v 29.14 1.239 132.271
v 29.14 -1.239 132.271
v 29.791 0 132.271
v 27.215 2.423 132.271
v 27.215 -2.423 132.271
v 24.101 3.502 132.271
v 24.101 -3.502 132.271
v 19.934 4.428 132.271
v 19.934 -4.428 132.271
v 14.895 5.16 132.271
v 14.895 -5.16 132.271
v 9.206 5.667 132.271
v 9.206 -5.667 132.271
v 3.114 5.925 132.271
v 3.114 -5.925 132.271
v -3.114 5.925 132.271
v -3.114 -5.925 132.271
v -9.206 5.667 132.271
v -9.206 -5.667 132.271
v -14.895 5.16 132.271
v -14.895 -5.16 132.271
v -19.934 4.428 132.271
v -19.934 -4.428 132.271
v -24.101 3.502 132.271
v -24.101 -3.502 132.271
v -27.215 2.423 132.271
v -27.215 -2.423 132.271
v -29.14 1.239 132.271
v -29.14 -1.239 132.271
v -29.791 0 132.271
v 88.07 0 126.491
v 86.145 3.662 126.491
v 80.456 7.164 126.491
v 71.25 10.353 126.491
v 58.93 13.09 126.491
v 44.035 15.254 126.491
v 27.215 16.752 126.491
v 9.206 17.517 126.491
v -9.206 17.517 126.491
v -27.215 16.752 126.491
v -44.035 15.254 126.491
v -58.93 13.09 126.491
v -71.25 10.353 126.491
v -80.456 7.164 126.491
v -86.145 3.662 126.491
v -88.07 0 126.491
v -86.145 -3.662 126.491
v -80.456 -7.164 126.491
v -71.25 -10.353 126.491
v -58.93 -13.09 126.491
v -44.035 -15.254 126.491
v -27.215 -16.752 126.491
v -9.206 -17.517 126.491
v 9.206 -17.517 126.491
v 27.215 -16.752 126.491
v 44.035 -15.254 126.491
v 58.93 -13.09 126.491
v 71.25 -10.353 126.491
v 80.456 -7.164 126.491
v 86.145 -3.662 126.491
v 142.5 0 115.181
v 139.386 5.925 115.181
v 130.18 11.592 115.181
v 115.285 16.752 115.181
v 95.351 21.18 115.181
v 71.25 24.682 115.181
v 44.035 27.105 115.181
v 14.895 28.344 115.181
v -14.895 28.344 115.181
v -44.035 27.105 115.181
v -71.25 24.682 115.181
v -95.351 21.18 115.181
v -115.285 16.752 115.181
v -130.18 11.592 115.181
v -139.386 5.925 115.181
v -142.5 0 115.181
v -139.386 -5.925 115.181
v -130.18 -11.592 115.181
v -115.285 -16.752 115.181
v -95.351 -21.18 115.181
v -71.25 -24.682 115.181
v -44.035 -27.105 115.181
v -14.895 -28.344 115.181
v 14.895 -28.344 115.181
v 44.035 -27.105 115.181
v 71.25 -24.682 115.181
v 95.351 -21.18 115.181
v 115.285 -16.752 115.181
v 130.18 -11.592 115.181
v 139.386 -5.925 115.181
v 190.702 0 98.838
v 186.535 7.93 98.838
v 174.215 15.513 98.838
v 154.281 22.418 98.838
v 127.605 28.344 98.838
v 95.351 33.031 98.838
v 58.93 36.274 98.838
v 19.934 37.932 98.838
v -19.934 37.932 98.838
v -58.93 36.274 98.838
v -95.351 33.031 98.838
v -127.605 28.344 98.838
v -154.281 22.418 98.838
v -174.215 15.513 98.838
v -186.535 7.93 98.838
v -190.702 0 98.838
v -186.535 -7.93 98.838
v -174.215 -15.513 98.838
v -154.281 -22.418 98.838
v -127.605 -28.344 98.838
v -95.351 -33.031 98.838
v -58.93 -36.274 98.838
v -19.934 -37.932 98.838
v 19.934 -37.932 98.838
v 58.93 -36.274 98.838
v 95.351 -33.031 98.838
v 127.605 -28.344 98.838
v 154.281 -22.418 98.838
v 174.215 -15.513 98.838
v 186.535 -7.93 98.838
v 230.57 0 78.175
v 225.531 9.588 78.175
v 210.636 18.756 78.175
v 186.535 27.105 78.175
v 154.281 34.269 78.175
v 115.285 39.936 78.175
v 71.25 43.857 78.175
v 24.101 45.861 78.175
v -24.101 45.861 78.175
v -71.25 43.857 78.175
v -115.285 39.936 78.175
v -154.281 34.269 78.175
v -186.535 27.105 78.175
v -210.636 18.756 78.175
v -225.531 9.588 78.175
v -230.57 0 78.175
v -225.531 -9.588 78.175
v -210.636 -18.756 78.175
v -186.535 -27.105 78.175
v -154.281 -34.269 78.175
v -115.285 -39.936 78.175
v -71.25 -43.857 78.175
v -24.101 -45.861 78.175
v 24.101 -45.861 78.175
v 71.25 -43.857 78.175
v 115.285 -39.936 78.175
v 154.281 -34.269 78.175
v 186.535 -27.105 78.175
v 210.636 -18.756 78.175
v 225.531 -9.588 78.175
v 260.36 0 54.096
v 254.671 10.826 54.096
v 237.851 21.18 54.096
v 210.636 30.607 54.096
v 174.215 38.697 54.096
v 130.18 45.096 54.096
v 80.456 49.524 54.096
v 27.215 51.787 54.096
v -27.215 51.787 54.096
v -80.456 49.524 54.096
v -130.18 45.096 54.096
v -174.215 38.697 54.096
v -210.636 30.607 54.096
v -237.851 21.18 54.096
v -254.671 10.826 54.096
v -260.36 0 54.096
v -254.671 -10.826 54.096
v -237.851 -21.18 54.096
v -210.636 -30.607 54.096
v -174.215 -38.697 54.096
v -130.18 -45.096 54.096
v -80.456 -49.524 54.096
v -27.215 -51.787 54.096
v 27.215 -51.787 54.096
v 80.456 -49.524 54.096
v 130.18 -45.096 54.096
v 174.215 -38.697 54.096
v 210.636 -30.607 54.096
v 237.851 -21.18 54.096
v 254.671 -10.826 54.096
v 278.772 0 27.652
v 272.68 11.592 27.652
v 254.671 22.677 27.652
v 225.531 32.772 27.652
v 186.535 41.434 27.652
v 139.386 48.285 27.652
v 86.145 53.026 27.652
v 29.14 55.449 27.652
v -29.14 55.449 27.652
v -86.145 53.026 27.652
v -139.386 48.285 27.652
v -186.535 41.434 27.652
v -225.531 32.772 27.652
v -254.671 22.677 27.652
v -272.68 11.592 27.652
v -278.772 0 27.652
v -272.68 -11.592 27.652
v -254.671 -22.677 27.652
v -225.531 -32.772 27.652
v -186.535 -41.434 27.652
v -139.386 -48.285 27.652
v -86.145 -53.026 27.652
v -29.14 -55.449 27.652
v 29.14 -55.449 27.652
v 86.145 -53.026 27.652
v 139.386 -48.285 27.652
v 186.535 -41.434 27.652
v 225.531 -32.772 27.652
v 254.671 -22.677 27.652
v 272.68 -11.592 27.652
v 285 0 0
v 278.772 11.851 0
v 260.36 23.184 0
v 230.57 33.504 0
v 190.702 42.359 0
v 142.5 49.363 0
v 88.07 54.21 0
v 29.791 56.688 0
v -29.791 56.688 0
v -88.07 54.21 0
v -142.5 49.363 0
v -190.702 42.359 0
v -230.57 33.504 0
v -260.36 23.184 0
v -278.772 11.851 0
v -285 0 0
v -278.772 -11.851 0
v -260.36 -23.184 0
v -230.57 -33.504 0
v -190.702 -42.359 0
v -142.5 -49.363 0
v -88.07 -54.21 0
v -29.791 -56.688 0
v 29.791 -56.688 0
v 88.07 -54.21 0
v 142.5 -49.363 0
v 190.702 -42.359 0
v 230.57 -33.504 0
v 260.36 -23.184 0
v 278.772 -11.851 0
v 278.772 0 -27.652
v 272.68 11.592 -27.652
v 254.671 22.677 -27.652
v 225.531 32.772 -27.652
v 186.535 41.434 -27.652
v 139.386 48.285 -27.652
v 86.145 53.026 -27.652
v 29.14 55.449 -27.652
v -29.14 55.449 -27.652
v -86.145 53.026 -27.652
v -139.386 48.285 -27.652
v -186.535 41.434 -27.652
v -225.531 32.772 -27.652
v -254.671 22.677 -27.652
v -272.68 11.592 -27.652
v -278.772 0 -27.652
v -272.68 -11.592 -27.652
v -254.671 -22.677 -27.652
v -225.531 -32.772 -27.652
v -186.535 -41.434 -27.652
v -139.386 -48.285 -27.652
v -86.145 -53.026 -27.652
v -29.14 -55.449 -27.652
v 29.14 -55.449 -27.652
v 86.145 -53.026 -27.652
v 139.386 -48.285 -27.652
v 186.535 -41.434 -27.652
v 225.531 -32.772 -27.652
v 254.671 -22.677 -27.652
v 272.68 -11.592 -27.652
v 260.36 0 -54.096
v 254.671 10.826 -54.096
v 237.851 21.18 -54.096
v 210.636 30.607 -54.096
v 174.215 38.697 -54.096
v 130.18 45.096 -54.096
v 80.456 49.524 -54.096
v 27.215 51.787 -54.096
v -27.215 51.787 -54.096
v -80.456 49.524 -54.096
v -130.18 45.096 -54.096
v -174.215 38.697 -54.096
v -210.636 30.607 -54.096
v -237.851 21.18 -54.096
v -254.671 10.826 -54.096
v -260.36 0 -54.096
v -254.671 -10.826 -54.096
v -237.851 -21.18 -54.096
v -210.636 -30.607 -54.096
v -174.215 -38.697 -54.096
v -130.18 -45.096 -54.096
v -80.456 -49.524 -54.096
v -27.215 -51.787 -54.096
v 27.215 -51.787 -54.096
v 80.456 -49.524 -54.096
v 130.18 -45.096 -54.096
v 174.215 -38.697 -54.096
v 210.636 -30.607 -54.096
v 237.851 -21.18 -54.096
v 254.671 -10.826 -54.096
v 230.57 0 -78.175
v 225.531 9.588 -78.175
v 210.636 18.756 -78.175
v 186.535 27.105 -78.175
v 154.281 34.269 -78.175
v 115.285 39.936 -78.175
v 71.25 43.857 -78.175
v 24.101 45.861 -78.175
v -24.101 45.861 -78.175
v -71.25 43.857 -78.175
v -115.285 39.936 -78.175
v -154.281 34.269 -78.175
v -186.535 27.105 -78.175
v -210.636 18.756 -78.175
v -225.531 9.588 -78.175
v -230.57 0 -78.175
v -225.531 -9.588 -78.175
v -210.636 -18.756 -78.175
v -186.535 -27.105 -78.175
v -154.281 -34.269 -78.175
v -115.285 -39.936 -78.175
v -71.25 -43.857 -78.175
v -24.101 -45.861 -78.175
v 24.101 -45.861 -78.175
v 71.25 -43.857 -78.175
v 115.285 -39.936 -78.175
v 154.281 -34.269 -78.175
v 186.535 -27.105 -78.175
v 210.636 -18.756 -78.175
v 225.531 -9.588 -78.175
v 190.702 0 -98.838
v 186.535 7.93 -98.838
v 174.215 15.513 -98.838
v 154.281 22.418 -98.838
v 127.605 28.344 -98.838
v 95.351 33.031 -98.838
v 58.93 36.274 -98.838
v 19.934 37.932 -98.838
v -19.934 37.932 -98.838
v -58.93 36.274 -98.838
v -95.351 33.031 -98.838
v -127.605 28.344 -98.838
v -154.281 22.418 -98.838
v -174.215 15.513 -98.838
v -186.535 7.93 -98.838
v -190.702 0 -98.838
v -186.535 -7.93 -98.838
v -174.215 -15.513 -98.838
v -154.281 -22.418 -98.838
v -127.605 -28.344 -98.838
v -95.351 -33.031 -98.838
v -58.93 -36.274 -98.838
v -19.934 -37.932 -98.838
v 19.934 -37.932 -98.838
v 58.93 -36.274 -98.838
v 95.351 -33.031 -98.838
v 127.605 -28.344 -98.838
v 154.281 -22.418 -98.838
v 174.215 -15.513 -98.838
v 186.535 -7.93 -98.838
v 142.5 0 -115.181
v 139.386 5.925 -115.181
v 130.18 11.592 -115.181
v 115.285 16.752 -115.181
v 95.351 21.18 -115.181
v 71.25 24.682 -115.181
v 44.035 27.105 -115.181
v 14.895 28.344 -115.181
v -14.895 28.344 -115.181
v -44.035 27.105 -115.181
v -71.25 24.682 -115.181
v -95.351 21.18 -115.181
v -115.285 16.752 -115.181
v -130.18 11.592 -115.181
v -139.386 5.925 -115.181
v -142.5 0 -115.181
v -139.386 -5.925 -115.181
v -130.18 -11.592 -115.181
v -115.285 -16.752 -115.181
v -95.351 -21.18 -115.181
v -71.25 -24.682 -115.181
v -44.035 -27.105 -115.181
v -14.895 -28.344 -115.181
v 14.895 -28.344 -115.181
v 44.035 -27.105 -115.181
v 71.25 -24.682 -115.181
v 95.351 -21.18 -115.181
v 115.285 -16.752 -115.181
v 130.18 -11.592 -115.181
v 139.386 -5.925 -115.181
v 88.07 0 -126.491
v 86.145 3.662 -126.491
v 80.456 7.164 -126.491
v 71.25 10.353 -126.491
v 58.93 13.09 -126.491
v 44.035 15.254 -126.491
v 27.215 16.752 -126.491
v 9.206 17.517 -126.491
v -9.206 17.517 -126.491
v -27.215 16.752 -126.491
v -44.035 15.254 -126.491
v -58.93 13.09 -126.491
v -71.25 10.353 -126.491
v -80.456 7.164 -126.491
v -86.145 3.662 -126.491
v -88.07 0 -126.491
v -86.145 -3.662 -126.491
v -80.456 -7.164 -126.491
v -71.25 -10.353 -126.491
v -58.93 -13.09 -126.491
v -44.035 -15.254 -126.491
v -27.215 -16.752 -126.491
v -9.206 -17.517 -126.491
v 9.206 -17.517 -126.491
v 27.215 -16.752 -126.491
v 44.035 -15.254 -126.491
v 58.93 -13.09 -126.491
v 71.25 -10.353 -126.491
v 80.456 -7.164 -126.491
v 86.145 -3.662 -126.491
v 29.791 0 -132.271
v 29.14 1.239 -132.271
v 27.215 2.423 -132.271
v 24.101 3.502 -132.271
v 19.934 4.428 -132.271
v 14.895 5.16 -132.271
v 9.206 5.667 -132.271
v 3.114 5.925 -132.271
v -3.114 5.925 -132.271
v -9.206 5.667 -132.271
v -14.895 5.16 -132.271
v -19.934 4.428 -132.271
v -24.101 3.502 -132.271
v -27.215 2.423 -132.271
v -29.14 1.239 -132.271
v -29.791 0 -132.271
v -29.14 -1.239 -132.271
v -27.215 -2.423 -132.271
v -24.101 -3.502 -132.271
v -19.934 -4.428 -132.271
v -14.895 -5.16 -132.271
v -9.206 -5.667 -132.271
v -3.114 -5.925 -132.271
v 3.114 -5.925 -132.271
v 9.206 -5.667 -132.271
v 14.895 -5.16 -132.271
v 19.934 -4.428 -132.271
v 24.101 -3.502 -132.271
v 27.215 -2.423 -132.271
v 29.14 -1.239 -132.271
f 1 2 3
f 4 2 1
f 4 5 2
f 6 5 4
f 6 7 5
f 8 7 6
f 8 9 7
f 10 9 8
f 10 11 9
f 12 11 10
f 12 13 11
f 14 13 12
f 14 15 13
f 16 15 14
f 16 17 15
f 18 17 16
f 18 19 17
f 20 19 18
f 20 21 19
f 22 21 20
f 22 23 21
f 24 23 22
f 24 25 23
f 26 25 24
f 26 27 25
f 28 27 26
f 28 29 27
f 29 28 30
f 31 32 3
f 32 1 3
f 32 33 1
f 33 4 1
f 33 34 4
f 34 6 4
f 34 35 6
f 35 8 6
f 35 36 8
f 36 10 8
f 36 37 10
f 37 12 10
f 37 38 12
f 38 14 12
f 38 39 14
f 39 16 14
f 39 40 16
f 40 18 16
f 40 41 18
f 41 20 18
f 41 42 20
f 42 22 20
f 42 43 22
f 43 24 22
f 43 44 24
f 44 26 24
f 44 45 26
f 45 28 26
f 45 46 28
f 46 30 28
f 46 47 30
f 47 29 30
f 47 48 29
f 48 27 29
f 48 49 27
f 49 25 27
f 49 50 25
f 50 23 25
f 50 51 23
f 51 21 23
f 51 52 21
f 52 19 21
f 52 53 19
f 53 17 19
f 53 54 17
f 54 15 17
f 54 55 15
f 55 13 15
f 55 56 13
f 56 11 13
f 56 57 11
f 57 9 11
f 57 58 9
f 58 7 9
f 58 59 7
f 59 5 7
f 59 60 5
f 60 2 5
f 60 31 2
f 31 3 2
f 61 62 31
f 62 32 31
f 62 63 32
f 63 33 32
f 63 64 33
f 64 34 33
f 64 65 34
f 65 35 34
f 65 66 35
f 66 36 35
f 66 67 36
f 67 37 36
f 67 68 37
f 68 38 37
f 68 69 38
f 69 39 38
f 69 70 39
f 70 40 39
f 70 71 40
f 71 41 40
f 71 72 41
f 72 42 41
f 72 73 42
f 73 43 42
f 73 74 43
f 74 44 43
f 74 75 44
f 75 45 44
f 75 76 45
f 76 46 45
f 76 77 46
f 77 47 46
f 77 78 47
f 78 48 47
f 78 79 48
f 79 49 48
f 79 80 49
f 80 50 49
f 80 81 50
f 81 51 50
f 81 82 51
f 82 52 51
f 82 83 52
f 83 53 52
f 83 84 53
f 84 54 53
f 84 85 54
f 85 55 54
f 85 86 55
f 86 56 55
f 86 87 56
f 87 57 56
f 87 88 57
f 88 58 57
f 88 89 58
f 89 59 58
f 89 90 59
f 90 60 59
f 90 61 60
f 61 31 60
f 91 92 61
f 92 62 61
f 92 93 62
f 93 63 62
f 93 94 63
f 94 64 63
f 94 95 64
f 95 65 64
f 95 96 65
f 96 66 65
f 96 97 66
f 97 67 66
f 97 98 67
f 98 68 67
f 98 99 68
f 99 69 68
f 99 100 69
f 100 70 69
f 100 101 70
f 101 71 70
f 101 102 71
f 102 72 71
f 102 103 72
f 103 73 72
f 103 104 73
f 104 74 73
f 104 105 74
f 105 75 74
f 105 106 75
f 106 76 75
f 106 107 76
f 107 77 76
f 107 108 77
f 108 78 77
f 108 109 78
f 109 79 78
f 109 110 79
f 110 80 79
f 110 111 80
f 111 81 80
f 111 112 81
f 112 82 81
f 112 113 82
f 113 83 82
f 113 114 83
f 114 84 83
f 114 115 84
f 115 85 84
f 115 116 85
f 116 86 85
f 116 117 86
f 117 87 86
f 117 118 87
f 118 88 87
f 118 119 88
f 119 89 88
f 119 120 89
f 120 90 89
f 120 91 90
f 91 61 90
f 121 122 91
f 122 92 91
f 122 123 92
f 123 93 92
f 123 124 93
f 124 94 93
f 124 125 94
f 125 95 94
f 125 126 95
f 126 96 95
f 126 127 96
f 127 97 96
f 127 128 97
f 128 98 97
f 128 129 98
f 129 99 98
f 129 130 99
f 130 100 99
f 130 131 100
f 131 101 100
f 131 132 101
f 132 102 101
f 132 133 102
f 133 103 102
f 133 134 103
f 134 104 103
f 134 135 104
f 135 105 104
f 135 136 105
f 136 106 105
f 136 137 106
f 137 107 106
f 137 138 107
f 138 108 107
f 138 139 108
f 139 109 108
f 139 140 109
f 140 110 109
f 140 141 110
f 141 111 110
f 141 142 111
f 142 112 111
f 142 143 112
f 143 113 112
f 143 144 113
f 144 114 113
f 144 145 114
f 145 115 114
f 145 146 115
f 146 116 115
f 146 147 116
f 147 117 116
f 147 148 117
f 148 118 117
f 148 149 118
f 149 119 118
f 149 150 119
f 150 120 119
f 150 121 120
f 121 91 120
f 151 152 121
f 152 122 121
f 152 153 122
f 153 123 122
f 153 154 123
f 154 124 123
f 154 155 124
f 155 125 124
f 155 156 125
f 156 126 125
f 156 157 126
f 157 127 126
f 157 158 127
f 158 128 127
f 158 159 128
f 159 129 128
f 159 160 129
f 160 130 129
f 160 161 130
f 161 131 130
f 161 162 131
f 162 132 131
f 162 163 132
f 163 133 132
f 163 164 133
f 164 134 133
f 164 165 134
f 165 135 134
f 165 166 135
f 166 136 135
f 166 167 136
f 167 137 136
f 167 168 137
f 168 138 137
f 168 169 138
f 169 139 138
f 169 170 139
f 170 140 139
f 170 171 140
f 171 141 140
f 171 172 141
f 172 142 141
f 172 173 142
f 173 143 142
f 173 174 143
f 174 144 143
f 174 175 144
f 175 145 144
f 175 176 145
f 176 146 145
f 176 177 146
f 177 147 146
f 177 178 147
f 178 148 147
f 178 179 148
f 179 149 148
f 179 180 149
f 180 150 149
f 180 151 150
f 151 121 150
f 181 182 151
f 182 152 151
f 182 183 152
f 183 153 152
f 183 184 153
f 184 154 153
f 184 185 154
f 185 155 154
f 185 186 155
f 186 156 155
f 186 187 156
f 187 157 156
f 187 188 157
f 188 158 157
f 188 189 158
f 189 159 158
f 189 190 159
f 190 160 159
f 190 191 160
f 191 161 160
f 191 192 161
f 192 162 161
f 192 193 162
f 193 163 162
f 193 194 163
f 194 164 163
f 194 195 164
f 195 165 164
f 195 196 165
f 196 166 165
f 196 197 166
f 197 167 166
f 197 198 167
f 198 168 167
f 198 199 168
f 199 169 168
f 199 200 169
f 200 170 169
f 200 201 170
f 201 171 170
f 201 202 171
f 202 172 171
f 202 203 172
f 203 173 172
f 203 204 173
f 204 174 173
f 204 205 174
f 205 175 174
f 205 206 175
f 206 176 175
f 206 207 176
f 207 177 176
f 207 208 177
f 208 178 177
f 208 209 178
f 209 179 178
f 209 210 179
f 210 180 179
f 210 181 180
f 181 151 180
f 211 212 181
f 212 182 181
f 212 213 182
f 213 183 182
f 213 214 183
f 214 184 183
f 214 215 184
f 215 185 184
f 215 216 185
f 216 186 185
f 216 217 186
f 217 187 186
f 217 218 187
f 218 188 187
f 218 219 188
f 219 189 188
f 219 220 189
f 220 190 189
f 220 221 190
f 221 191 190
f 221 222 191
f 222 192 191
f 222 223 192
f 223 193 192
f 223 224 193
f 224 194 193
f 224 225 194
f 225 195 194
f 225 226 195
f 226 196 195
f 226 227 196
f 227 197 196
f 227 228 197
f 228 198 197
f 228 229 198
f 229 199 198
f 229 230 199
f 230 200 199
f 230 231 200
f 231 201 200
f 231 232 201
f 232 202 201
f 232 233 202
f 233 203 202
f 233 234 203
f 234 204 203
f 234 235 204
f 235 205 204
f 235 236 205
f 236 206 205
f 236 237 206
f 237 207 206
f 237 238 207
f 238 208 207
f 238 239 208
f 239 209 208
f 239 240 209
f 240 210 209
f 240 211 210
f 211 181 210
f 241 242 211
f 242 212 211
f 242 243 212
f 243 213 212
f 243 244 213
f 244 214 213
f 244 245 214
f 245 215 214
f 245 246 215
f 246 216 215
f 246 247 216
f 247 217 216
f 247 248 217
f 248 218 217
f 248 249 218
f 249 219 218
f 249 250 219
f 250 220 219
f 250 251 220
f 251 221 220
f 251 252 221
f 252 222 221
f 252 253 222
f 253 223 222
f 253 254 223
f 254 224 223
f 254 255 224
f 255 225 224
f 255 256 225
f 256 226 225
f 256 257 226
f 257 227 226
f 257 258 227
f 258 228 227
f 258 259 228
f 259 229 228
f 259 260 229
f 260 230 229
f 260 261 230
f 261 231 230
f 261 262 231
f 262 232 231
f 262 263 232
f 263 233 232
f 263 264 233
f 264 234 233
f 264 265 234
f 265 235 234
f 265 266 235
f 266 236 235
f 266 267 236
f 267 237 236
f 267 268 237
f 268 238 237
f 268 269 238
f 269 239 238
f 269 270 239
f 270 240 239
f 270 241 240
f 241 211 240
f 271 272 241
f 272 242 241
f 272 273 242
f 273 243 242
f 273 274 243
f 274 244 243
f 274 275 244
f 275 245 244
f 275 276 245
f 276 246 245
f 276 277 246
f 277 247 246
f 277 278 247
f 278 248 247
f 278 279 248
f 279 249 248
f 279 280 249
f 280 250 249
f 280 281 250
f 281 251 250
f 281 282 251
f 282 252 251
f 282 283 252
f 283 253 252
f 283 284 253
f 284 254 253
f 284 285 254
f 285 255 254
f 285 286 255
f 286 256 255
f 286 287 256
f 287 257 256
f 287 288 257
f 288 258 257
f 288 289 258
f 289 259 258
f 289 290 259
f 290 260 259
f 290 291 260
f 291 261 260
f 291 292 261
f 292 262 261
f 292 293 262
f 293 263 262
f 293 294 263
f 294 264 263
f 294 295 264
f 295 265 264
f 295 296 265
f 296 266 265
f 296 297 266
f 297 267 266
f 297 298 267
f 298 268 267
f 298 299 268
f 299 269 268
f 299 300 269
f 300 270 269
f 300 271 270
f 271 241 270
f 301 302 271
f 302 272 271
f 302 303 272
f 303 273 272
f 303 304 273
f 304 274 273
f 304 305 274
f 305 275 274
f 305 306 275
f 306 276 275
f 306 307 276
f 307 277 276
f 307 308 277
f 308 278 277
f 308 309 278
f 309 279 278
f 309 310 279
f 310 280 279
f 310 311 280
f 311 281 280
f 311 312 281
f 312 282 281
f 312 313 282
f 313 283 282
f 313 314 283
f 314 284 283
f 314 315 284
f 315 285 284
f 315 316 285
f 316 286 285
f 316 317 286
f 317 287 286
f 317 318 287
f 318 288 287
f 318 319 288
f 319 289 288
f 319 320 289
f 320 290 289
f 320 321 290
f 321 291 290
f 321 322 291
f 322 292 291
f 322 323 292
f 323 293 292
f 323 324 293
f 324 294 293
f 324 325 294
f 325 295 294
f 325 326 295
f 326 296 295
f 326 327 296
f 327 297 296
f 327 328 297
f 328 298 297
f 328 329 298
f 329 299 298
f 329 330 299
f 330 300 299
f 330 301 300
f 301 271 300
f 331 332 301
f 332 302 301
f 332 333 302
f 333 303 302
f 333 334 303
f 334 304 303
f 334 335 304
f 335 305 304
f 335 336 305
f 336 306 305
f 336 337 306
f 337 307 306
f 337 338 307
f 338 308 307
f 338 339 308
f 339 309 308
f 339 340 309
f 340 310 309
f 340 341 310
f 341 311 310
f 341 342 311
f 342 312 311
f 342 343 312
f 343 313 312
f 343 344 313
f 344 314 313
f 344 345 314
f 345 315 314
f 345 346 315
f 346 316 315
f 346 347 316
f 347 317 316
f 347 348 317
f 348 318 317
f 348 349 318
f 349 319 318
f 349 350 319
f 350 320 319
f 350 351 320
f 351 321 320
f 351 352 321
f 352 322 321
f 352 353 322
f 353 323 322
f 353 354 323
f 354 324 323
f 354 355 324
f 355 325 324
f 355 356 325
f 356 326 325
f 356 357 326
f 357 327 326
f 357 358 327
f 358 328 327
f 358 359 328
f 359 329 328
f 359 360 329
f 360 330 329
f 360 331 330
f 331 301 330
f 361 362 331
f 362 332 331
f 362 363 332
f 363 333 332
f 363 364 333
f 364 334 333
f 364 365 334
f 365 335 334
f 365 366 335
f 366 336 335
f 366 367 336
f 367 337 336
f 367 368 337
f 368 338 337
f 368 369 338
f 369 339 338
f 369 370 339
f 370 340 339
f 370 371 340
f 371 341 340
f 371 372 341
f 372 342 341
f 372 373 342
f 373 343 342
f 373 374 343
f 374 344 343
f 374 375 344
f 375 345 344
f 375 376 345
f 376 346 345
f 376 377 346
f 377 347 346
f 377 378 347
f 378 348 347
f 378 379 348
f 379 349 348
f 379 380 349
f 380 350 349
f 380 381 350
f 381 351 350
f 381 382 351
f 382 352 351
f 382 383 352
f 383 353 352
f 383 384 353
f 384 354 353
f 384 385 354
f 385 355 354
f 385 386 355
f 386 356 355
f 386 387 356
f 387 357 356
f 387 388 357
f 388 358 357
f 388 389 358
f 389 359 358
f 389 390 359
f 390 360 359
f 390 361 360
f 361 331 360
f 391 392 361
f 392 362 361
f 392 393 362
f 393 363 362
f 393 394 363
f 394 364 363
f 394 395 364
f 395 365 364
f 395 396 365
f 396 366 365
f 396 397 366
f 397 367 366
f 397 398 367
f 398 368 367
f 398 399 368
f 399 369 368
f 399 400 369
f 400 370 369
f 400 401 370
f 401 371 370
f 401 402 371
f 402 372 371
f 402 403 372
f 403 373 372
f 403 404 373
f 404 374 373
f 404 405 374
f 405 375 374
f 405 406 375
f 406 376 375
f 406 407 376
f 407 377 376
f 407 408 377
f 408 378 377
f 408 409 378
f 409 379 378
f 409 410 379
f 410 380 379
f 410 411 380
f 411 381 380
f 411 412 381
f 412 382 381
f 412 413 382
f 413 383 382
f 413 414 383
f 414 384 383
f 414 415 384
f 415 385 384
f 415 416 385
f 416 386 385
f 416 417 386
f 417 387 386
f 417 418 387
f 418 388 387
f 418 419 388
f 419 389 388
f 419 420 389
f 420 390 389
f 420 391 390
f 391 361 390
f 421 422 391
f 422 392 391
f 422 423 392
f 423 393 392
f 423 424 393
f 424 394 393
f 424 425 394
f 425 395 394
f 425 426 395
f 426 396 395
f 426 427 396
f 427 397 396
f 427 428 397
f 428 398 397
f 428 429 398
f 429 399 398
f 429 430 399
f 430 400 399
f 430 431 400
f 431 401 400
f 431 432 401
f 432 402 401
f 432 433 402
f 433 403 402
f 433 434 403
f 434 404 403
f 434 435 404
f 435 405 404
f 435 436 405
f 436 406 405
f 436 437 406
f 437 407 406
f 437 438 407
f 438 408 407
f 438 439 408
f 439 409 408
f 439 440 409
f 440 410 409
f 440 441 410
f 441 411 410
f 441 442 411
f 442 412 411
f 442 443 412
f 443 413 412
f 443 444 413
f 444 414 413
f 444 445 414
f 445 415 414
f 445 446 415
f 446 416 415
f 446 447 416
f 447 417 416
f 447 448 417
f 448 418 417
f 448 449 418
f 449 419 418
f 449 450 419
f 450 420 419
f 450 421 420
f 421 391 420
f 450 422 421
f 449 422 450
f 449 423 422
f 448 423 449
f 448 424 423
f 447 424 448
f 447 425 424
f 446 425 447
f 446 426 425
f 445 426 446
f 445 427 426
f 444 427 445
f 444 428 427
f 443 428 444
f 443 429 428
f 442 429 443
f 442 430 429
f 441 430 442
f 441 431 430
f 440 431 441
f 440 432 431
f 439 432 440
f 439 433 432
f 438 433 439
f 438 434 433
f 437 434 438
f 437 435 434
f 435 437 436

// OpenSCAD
// Generated by SolidPython 1.0.1 on 2020-07-29 00:46:51


scale(v = [15, 3, 7]) {
	sphere(r = 19);
}
/***********************************************
*********      SolidPython code:      **********
************************************************
 
# import packages: SolidPython
from solid import *
from solid.utils import *
from itertools import chain, combinations, permutations


class Resize:

    def __init__(self, scad_file):
        self.scad_file = scad_file
        #self.scad_file = import_scad(scad_file)
        # cone/cylinder param:
        self.r1 = 0
        self.r2 = 0
        self.h = 0
        # rectangular prism param:
        self.w = 0
        self.l = 0
        # ellipse param:
        self.r = 0

    # import OpenScad code (file name corresponds to shape)


    # classify shape + parameters
    def assign(self, param1, param2, param3):
        if self.scad_file == 'cone.scad':
            self.r1 = param1
            self.r2 = param2
            self.h = param3
        elif self.scad_file == 'cylinder.scad':
            self.r1 = param1
            self.r2 = param2
            self.h = param3
        elif self.scad_file == 'rectangularPrism.scad':
            self.h = param1
            self.l = param2
            self.w = param3
        else:
            self.r = param1
            self.h = param2

    # resize parameters
    def iterate(self):
        x = range(3, 20, 2)
        i = 1
        if self.scad_file == 'cone.scad':
            tempList = list(permutations(x, 2))
            for temp in tempList:
                param1 = temp[0]
                param2 = temp[1]
                filepath = 'produced_scad_files/' + 'cone' + str(param1) + '_' + str(param2) + '_' + '.scad'
                scad_render_to_file(cylinder(h=param1, r1=param2, r2=0), filepath)

        elif self.scad_file == 'cylinder.scad':
            tempList = list(permutations(x, 3))
            for temp in tempList:
                param1 = temp[0]
                param2 = temp[1]
                filepath = 'produced_scad_files/' + 'cylinder' + str(param1) + '_' + str(param2) + '_' + '.scad'
                scad_render_to_file(cylinder(h=param1, r1=param2, r2=param2), filepath)

        elif self.scad_file == 'rectangularPrism.scad':
            tempList = list(permutations(x, 3))
            for temp in tempList:
                param1 = temp[0]
                param2 = temp[1]
                param3 = temp[2]
                filepath = 'produced_scad_files/' + 'rectangularPrism' + str(param1) + '_' + str(param2) + '_' + str(
                    param3) + '.scad'
                scad_render_to_file(cube(size=(param1, param2, param3)), filepath)

        elif self.scad_file == 'ellipse.scad':
            tempList = list(permutations(x, 4))
            for temp in tempList:
                param1 = temp[0]
                param2 = temp[1]
                param3 = temp[2]
                param4 = temp[3]
                filepath = 'produced_scad_files/' + 'ellipse' + str(param1) + '_' + str(param2) + '_' + str(param3) + '_' + str(param4) + '.scad'
                scad_render_to_file(scale([param1, param2, param3])(sphere(r=param4)), filepath)

    def render_to_scadfile(self):
        scad_render_to_file(scad, 'example.scad') 
 
************************************************/
